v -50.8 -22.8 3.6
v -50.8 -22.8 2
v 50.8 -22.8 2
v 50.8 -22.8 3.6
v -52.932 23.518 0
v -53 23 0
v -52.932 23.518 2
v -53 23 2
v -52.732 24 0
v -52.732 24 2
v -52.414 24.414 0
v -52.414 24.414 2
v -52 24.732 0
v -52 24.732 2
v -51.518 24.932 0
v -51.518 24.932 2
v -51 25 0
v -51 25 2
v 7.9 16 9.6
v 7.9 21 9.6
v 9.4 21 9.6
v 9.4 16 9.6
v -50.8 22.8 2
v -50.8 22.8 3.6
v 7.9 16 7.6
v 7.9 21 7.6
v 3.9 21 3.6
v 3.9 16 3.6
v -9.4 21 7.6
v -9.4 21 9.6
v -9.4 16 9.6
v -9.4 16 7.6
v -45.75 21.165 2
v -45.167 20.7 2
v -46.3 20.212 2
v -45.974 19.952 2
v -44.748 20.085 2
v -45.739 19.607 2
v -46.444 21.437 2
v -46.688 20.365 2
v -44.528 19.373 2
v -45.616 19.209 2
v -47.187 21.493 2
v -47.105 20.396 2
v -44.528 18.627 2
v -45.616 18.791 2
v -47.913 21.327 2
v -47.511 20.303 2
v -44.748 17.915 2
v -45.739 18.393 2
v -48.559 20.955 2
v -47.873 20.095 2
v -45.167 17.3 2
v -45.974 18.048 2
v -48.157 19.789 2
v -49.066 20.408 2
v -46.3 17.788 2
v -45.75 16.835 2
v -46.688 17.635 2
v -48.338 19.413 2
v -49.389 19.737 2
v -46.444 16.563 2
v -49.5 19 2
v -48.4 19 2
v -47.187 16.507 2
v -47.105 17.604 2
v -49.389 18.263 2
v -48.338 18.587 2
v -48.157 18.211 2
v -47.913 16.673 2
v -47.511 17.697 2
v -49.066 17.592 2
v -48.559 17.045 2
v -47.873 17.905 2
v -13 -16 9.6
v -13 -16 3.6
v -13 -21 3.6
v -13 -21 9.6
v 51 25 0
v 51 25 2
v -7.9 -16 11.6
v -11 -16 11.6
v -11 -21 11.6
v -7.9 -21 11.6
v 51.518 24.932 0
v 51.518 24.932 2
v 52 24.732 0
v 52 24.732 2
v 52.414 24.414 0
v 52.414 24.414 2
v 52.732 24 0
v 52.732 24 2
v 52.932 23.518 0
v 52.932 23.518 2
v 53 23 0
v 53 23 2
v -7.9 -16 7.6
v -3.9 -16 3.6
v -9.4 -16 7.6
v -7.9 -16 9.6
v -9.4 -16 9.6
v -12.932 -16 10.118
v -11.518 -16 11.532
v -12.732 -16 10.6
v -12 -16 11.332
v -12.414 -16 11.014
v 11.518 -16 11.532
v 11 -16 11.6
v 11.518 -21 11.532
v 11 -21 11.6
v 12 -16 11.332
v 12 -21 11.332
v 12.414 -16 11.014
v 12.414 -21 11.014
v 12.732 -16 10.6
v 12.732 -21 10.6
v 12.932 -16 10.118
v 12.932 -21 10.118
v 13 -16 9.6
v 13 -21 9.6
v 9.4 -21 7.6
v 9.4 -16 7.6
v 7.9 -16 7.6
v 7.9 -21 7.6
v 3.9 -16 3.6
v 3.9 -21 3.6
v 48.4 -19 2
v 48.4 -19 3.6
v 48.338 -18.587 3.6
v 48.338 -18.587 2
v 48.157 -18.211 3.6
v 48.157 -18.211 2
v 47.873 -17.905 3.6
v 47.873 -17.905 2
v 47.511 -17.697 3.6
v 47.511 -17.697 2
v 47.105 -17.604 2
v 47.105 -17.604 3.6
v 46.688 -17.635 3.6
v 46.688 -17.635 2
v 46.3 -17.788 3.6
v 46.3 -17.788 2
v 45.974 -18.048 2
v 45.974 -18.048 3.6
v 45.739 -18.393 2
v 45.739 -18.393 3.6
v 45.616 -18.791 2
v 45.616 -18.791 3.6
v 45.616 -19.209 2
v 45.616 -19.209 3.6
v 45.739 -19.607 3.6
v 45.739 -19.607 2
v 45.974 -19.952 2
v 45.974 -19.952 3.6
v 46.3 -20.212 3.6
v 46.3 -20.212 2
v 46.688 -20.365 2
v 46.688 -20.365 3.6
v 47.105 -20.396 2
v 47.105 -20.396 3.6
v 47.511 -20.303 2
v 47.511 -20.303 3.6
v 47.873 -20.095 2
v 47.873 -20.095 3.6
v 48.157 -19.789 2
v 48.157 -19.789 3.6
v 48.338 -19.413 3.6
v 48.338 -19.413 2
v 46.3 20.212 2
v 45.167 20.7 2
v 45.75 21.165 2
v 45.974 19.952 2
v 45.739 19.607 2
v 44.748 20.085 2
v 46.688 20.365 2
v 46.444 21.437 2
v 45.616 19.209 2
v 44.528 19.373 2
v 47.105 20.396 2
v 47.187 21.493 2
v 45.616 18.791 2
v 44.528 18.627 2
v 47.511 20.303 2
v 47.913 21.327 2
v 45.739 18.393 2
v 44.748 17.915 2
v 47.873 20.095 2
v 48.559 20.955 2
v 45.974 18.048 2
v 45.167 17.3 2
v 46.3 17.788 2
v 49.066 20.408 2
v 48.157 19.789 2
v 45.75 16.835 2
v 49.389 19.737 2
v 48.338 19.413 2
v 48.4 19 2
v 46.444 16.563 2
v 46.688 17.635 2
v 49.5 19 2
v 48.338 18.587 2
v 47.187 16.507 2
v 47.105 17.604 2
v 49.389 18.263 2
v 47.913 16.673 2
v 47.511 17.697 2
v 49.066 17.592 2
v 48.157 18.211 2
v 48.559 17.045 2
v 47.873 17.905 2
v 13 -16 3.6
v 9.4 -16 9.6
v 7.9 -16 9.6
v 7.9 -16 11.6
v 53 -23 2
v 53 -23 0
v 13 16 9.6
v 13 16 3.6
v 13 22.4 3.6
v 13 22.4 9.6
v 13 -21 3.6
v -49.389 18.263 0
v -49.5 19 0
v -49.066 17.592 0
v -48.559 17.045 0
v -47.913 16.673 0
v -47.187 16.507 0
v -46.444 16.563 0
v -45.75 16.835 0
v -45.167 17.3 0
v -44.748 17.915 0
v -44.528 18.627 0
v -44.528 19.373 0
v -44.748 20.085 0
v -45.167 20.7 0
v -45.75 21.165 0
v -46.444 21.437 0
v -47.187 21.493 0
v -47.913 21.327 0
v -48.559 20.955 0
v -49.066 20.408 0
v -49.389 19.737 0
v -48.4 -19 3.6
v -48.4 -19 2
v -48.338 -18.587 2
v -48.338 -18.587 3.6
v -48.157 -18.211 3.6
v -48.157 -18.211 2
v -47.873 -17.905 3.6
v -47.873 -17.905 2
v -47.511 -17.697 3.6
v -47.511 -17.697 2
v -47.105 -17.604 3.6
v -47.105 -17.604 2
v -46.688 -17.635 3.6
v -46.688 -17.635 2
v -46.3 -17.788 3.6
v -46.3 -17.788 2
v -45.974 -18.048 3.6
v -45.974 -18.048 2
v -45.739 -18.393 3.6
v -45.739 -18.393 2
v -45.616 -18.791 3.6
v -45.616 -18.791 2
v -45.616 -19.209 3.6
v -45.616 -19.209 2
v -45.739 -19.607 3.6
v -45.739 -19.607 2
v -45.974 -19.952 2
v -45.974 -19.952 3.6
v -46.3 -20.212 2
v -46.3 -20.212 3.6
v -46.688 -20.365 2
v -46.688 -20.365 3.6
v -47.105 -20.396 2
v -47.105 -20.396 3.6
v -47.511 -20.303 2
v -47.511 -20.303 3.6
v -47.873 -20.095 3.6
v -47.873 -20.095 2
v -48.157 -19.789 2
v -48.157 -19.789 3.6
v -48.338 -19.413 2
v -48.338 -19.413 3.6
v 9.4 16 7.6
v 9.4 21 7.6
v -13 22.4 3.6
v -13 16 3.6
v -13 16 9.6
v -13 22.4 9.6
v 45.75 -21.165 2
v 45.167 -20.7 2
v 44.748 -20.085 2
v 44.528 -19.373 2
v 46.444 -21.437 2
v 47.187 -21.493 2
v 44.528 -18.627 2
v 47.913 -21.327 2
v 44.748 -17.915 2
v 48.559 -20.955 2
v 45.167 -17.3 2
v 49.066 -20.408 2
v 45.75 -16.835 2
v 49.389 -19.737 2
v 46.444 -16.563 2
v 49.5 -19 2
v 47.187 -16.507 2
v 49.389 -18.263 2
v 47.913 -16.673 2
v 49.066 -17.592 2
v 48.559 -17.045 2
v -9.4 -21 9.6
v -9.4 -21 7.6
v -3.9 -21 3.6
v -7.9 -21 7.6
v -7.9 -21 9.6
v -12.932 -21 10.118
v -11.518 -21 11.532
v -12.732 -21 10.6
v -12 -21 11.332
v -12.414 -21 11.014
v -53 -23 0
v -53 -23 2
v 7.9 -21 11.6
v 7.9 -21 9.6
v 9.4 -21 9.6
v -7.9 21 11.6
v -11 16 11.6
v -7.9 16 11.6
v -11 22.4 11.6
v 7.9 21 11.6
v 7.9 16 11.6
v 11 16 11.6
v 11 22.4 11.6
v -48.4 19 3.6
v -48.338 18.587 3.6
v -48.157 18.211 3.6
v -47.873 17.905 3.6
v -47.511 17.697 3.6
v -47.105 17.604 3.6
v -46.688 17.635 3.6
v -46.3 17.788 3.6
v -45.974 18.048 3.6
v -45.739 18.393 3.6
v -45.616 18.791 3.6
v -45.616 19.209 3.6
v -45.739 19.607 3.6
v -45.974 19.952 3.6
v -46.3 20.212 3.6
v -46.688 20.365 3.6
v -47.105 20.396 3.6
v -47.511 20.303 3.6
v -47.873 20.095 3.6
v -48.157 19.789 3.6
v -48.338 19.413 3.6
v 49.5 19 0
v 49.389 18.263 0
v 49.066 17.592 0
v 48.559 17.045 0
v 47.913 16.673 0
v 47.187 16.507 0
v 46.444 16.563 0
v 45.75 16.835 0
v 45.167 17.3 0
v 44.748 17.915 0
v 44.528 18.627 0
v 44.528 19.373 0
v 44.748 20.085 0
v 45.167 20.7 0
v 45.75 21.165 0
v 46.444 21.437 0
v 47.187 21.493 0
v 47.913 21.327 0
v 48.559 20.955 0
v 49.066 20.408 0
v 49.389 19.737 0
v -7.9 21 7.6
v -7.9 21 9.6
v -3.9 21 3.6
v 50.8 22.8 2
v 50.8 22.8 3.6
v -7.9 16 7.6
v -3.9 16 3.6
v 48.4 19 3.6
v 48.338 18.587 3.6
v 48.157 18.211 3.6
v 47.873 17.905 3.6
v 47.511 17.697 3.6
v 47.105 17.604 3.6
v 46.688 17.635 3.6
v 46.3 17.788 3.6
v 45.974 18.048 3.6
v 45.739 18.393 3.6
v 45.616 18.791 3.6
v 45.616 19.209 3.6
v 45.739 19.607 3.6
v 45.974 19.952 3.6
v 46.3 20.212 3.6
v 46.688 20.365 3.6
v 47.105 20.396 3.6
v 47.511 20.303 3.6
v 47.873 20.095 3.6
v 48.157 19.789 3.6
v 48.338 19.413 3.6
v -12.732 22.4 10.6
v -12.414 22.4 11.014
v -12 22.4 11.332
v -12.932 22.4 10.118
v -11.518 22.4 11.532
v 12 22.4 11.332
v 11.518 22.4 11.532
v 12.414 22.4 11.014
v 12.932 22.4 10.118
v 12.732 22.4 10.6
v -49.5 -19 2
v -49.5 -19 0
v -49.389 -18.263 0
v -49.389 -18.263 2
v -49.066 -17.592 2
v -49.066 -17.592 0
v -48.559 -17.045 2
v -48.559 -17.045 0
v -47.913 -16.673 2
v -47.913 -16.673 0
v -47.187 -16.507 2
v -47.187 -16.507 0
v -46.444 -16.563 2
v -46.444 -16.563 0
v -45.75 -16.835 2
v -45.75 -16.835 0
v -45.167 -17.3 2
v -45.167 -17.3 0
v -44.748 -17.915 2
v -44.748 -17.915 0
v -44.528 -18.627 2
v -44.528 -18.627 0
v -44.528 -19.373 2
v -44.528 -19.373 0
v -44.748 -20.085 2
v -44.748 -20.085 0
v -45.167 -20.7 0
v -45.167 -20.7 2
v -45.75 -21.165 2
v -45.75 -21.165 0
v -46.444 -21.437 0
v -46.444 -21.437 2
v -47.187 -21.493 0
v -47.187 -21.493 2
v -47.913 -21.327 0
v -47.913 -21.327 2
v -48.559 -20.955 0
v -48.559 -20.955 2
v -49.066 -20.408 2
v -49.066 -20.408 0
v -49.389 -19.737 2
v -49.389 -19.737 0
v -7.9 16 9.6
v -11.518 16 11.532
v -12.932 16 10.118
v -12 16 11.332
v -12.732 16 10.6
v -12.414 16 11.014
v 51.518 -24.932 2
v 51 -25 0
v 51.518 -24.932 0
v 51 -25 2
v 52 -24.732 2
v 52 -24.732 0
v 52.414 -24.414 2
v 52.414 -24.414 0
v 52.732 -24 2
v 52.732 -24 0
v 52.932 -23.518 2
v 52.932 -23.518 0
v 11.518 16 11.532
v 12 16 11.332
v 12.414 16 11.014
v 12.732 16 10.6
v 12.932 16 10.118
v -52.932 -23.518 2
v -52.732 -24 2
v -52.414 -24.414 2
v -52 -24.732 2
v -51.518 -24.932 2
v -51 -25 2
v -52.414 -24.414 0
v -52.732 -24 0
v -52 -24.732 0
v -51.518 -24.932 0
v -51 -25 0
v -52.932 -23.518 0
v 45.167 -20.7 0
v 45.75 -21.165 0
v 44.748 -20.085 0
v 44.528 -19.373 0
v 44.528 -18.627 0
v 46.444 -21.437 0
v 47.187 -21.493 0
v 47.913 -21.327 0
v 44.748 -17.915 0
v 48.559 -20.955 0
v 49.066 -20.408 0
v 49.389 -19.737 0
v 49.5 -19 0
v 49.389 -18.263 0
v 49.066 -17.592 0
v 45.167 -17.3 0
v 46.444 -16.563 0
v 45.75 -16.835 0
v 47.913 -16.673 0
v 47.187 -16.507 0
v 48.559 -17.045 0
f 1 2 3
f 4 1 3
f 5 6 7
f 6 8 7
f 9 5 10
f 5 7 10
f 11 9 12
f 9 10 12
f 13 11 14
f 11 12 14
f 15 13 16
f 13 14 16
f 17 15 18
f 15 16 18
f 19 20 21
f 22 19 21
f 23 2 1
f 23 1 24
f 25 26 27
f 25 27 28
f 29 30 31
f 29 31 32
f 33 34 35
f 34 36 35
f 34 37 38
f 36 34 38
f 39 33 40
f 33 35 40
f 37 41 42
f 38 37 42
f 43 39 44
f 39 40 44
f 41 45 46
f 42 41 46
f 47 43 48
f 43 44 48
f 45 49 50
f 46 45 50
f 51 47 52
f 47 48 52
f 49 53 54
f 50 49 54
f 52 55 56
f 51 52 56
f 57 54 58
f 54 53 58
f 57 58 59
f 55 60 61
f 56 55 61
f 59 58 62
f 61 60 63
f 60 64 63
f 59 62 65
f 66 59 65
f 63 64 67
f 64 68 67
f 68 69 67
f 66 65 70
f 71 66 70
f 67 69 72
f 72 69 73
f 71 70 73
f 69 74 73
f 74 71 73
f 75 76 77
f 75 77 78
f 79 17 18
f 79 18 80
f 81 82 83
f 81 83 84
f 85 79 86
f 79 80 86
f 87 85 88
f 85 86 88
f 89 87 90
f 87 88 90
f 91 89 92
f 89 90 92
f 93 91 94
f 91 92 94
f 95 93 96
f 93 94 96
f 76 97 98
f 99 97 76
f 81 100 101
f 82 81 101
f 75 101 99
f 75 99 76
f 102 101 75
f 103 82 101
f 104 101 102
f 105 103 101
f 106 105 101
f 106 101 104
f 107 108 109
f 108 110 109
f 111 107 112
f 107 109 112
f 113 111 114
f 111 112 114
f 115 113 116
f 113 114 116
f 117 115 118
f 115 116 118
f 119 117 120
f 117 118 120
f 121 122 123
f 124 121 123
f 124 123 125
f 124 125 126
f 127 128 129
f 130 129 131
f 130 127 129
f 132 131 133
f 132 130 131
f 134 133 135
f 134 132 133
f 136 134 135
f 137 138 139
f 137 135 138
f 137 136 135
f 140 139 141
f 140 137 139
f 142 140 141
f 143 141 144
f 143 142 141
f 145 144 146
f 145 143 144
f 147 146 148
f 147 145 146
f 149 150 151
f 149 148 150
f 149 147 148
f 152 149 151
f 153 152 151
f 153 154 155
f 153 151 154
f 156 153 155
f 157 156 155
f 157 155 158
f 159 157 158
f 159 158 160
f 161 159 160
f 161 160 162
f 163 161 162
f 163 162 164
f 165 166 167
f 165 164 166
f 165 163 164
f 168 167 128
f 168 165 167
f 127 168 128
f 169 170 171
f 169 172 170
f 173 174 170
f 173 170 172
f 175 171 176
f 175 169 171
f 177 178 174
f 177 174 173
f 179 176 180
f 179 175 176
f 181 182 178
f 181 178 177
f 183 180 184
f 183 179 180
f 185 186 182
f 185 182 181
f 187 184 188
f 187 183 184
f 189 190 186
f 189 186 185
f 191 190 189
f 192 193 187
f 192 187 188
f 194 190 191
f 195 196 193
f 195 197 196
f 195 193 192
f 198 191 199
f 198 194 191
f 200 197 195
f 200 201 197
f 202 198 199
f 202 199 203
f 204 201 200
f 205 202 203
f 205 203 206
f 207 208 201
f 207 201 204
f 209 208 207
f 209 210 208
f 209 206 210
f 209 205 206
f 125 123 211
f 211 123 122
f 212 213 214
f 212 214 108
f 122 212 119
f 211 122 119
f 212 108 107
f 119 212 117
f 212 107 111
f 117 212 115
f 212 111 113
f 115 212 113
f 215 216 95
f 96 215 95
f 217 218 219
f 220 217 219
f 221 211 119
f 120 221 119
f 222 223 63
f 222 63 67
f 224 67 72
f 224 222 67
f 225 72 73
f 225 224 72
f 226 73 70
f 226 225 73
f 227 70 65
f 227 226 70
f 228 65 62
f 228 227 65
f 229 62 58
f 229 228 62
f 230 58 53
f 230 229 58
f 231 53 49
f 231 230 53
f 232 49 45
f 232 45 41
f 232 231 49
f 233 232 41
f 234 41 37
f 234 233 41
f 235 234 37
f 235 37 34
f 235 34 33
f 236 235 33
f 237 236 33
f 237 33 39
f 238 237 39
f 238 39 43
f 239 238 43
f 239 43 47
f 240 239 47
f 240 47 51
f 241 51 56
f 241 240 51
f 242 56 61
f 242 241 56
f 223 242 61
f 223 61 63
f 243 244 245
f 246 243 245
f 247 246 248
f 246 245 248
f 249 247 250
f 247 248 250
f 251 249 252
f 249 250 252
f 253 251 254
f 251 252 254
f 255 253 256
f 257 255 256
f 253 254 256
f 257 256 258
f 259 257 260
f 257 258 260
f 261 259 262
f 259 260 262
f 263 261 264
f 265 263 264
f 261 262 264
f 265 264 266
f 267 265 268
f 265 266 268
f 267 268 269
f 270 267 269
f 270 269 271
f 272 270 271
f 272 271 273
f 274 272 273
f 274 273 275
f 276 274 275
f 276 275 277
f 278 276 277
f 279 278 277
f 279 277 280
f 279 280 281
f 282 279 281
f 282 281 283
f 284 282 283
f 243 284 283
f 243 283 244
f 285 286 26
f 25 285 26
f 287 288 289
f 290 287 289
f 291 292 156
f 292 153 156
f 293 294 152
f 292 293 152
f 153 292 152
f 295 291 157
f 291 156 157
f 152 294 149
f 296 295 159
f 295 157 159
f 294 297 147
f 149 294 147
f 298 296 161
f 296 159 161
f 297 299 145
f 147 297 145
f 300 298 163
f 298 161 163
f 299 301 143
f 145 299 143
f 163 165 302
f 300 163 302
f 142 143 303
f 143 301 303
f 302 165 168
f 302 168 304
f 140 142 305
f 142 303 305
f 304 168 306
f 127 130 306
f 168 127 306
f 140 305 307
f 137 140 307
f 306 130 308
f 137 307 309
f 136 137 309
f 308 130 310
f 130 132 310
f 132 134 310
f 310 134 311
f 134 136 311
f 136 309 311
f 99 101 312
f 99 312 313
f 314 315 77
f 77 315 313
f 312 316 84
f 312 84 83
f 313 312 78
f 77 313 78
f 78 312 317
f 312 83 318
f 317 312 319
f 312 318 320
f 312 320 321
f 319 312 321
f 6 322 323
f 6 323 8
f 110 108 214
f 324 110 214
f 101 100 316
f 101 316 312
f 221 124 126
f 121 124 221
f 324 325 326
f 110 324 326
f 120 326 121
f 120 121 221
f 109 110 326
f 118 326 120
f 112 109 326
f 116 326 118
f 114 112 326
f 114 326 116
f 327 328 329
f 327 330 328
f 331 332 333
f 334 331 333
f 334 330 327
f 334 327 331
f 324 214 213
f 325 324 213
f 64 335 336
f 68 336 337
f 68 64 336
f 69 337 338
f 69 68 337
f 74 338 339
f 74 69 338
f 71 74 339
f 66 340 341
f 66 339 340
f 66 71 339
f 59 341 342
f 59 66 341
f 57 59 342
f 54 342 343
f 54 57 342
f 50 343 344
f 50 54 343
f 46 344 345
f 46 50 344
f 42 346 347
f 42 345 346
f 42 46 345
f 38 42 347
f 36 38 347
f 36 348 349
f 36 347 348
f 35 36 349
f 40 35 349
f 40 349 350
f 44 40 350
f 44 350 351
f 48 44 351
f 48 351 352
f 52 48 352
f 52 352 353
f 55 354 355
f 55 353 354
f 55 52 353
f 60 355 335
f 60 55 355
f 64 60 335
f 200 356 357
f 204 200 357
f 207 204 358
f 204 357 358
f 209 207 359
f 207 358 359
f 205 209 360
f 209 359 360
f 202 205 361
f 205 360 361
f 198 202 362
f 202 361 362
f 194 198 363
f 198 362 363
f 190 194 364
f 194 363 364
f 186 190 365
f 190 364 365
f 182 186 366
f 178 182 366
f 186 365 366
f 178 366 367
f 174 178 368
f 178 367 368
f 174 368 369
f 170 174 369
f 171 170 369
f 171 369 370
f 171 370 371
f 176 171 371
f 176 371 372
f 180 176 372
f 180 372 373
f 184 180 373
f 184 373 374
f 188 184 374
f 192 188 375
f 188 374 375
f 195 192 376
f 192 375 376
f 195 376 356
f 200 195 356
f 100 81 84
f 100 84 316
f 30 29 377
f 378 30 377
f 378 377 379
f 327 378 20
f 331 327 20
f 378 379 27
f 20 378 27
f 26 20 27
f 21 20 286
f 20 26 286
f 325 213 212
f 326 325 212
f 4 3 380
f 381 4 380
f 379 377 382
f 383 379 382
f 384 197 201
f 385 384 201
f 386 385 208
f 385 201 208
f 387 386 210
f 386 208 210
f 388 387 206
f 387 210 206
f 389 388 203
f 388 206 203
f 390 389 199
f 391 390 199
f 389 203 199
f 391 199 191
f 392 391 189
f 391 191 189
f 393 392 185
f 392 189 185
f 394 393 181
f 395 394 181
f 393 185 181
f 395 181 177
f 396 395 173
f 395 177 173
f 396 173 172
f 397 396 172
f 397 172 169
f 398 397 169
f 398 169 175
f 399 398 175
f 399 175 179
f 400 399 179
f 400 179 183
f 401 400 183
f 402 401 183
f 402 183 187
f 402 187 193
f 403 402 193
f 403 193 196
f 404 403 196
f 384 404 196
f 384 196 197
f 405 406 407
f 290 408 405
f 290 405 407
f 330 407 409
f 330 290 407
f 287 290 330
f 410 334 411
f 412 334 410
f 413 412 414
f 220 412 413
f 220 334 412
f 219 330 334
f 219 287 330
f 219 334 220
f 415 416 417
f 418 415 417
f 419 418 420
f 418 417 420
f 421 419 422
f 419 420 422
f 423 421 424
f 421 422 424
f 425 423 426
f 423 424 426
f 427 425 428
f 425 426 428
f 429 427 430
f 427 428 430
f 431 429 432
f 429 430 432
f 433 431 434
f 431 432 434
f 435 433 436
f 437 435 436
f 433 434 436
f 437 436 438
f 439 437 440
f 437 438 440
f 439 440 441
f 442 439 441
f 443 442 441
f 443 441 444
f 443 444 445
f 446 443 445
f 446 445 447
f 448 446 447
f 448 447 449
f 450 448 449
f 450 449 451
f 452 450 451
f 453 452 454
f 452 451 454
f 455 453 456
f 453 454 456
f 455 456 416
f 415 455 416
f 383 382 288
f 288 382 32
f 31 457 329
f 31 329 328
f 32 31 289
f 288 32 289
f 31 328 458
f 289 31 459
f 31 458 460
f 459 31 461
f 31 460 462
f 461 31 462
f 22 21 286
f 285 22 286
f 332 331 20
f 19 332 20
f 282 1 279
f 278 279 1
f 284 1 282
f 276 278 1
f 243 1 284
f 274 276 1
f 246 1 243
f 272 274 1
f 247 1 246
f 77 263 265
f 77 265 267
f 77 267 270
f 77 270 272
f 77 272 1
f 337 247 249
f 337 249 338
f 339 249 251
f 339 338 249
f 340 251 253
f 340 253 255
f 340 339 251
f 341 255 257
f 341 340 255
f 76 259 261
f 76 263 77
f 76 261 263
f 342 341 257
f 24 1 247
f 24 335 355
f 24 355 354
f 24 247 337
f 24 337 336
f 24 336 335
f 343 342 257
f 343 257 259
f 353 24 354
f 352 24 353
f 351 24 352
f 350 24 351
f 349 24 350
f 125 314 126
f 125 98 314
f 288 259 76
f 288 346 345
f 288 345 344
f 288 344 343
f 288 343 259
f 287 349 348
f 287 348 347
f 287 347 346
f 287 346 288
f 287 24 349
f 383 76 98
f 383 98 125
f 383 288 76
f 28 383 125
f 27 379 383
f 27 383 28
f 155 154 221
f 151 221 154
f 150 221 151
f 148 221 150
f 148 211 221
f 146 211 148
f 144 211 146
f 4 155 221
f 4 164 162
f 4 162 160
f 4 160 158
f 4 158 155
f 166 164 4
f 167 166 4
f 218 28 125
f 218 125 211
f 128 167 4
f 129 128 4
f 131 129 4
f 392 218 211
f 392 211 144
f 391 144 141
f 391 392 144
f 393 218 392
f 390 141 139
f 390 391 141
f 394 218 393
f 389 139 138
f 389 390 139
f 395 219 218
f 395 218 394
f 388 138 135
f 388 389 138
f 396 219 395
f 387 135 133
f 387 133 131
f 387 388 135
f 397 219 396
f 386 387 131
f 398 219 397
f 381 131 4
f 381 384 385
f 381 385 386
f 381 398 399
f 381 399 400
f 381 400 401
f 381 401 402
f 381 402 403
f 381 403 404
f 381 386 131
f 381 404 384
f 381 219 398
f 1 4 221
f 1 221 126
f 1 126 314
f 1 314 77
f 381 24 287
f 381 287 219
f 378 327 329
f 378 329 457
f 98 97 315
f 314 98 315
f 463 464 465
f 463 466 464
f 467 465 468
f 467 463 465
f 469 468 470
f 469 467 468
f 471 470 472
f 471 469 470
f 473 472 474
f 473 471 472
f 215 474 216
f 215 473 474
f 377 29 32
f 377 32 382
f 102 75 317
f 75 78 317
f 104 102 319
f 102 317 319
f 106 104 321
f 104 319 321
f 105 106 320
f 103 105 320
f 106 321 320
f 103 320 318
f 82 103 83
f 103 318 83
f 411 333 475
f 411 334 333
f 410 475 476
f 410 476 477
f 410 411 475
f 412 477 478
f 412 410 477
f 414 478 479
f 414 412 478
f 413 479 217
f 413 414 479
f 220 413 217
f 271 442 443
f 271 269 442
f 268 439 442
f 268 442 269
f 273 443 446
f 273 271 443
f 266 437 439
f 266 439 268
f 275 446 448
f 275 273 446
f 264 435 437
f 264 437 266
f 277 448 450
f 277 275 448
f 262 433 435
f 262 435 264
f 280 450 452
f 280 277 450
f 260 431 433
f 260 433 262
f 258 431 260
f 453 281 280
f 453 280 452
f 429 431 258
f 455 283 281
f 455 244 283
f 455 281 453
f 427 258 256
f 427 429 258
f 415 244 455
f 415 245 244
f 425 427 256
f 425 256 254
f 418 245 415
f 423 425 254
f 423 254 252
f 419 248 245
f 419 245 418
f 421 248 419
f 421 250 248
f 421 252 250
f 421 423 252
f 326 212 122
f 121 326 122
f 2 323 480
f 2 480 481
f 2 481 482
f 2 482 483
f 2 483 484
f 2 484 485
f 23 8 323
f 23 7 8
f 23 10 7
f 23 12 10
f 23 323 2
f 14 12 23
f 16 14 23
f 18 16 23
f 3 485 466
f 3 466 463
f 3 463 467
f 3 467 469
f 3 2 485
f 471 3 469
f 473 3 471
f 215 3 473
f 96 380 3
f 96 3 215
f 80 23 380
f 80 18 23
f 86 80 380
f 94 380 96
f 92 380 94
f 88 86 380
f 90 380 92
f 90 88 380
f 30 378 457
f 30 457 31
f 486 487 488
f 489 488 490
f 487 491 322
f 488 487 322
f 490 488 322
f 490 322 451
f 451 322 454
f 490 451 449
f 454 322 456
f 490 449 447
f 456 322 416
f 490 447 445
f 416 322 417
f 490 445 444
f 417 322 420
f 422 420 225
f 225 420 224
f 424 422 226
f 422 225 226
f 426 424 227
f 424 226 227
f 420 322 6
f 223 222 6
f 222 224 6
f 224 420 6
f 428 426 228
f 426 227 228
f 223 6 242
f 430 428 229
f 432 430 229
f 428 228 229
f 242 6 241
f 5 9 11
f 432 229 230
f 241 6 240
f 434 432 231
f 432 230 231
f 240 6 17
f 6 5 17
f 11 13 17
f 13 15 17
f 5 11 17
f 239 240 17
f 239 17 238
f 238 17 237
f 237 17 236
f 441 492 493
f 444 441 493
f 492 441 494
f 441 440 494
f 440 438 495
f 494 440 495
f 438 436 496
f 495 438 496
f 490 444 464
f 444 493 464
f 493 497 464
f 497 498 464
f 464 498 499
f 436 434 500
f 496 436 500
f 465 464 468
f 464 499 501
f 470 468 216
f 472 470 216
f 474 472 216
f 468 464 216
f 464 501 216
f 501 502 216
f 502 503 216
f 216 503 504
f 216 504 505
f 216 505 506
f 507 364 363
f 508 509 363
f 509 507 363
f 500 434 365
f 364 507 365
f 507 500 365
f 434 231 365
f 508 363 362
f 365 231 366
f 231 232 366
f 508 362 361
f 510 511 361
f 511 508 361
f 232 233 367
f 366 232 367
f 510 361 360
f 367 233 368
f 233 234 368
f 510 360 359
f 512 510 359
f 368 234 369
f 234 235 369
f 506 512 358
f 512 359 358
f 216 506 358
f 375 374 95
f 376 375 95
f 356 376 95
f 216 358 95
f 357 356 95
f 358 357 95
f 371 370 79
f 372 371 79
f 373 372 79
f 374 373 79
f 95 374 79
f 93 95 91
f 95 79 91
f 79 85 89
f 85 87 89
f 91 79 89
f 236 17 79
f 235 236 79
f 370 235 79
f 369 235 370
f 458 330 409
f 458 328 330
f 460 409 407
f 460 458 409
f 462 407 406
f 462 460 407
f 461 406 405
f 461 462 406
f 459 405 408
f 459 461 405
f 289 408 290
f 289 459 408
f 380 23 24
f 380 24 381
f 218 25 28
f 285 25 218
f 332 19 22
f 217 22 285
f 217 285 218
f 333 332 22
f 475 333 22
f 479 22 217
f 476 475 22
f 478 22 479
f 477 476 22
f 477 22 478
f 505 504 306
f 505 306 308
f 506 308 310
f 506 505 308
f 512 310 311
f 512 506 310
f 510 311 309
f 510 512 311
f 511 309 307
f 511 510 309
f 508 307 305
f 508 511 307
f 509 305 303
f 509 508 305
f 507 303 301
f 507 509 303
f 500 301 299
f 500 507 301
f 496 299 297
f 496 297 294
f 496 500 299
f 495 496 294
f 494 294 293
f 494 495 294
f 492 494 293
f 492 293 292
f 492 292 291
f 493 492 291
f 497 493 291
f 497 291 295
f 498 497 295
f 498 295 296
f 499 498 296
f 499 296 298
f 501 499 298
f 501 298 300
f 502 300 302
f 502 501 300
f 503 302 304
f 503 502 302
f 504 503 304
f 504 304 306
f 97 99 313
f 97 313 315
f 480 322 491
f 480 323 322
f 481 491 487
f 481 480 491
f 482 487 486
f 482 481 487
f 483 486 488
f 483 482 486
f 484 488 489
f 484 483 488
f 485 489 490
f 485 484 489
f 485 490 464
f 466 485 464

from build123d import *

# Parameters (mm, degrees)
SKETCH_1_W                     = 106
SKETCH_1_H                     = 50
BODY_DEPTH                     = 2
SKETCH_2_W                     = 101.6
SKETCH_2_H                     = 45.6
INTERNALBODY_DEPTH             = 1.6
SKETCH_3_R                     = 1.4
HOLESCREW_DEPTH                = 59.710816721
SKETCH_3_3_R                   = 2.5
SKETCH_3_3_R_2                 = 1.4
TOPSCREWPLACE_DEPTH            = 2
SCREWMIRROR2_COPY_1_SKETCH_R   = 1.4
SCREWMIRROR2_COPY_1_DEPTH      = 59.710816721
SCREWMIRROR2_COPY_2_SKETCH_R   = 2.5
SCREWMIRROR2_COPY_2_SKETCH_R_2 = 1.4
SCREWMIRROR2_COPY_2_DEPTH      = 2
CORNERS_R                      = 2
SKETCH_4_W                     = 26
SKETCH_4_H                     = 1.4
ARDUINONANOSTOPS_DEPTH         = 8
ARDUINONANOHOLDER1_DEPTH       = 5
PATTERN_LINEAR_1_COUNT         = 2
PATTERN_LINEAR_1_PITCH         = 37
CHAMFER_1_SIZE                 = 4
FILLET_1_R                     = 2


with BuildPart() as part:
    # Эскиз1 → Body (new body)
    with BuildSketch(Plane.XY):
        Rectangle(SKETCH_1_W, SKETCH_1_H)
    extrude(amount=BODY_DEPTH)

    # Эскиз2 → InternalBody (add)
    with BuildSketch(Plane.XY.offset(2)):
        Rectangle(SKETCH_2_W, SKETCH_2_H)
    extrude(amount=INTERNALBODY_DEPTH)

    # Эскиз3 → HoleScrew (cut, through all)
    with BuildSketch(Plane(origin=(0, 0, 0), x_dir=(-1, 0, 0), z_dir=(0, 0, -1))):
        with Locations((47, -19)):
            Circle(SKETCH_3_R)
    holescrew = extrude(amount=-HOLESCREW_DEPTH, mode=Mode.SUBTRACT)

    # Эскиз3<3> → TopScrewPlace (cut)
    with BuildSketch(Plane(origin=(0, 0, 0), x_dir=(-1, 0, 0), z_dir=(0, 0, -1))):
        with Locations((47, -19)):
            Circle(SKETCH_3_3_R)
        with Locations((47, -19)):
            Circle(SKETCH_3_3_R_2, mode=Mode.SUBTRACT)
    topscrewplace = extrude(amount=-TOPSCREWPLACE_DEPTH, mode=Mode.SUBTRACT)

    # ScrewMrror1: HoleScrew, TopScrewPlace across plane
    add(holescrew.mirror(Plane.ZX), mode=Mode.SUBTRACT)
    add(topscrewplace.mirror(Plane.ZX), mode=Mode.SUBTRACT)

    # ScrewMirror2: HoleScrew, TopScrewPlace across plane
    add(holescrew.mirror(Plane(origin=(0, 0, 0), x_dir=(0, 0, 1), z_dir=(1, 0, 0))), mode=Mode.SUBTRACT)
    add(topscrewplace.mirror(Plane(origin=(0, 0, 0), x_dir=(0, 0, 1), z_dir=(1, 0, 0))), mode=Mode.SUBTRACT)

    # ScrewMirror2 copy 1 sketch → ScrewMirror2 copy 1 (cut, through all)
    with BuildSketch(Plane(origin=(0, 0, 0), x_dir=(1, 0, 0), z_dir=(0, 0, -1))):
        with Locations((47, -19)):
            Circle(SCREWMIRROR2_COPY_1_SKETCH_R)
    extrude(amount=-SCREWMIRROR2_COPY_1_DEPTH, mode=Mode.SUBTRACT)

    # ScrewMirror2 copy 2 sketch → ScrewMirror2 copy 2 (cut)
    with BuildSketch(Plane(origin=(0, 0, 0), x_dir=(1, 0, 0), z_dir=(0, 0, -1))):
        with Locations((47, -19)):
            Circle(SCREWMIRROR2_COPY_2_SKETCH_R)
        with Locations((47, -19)):
            Circle(SCREWMIRROR2_COPY_2_SKETCH_R_2, mode=Mode.SUBTRACT)
    extrude(amount=-SCREWMIRROR2_COPY_2_DEPTH, mode=Mode.SUBTRACT)

    # Corners
    corners_edges = [part.edges().sort_by_distance(p)[0] for p in [
        (53, -25, 1),
        (-53, -25, 1),
        (-53, 25, 1),
        (53, 25, 1),
    ]]
    fillet(corners_edges, radius=CORNERS_R)

    # Эскиз4 → ArduinoNanoStops (add)
    with BuildSketch(Plane.XY.offset(3.6)):
        with Locations((0, 21.7)):
            Rectangle(SKETCH_4_W, SKETCH_4_H)
    extrude(amount=ARDUINONANOSTOPS_DEPTH)

    # Эскиз5 → ArduinoNanoHolder1 (add)
    with BuildSketch(Plane.XZ.offset(-21)):
        Polygon((-7.9, 11.6), (-7.9, 9.6), (-9.4, 9.6), (-9.4, 7.6), (-7.9, 7.6), (-7.9, 3.6), (-13, 3.6), (-13, 11.6), align=None)
        Polygon((7.9, 11.6), (7.9, 9.6), (9.4, 9.6), (9.4, 7.6), (7.9, 7.6), (7.9, 3.6), (13, 3.6), (13, 11.6), align=None)
    arduinonanoholder1 = extrude(amount=ARDUINONANOHOLDER1_DEPTH)

    # Линейный массив1: ArduinoNanoHolder1 ×2
    with Locations(*[(0, -i * PATTERN_LINEAR_1_PITCH, 0) for i in range(1, PATTERN_LINEAR_1_COUNT)]):
        add(arduinonanoholder1)

    # Фаска1
    chamfer_1_edges = [part.edges().sort_by_distance(p)[0] for p in [
        (7.9, 18.5, 3.6),
        (7.9, -18.5, 3.6),
        (-7.9, -18.5, 3.6),
        (-7.9, 18.5, 3.6),
    ]]
    chamfer(chamfer_1_edges, length=CHAMFER_1_SIZE - 0.0001)  # a hair under: the kernel refuses the full size

    # Скругление1
    fillet_1_edges = [part.edges().sort_by_distance(p)[0] for p in [
        (-13, 19.2, 11.6),
        (13, 19.2, 11.6),
        (-13, -18.5, 11.6),
        (13, -18.5, 11.6),
    ]]
    fillet(fillet_1_edges, radius=FILLET_1_R)


solid = part.part
